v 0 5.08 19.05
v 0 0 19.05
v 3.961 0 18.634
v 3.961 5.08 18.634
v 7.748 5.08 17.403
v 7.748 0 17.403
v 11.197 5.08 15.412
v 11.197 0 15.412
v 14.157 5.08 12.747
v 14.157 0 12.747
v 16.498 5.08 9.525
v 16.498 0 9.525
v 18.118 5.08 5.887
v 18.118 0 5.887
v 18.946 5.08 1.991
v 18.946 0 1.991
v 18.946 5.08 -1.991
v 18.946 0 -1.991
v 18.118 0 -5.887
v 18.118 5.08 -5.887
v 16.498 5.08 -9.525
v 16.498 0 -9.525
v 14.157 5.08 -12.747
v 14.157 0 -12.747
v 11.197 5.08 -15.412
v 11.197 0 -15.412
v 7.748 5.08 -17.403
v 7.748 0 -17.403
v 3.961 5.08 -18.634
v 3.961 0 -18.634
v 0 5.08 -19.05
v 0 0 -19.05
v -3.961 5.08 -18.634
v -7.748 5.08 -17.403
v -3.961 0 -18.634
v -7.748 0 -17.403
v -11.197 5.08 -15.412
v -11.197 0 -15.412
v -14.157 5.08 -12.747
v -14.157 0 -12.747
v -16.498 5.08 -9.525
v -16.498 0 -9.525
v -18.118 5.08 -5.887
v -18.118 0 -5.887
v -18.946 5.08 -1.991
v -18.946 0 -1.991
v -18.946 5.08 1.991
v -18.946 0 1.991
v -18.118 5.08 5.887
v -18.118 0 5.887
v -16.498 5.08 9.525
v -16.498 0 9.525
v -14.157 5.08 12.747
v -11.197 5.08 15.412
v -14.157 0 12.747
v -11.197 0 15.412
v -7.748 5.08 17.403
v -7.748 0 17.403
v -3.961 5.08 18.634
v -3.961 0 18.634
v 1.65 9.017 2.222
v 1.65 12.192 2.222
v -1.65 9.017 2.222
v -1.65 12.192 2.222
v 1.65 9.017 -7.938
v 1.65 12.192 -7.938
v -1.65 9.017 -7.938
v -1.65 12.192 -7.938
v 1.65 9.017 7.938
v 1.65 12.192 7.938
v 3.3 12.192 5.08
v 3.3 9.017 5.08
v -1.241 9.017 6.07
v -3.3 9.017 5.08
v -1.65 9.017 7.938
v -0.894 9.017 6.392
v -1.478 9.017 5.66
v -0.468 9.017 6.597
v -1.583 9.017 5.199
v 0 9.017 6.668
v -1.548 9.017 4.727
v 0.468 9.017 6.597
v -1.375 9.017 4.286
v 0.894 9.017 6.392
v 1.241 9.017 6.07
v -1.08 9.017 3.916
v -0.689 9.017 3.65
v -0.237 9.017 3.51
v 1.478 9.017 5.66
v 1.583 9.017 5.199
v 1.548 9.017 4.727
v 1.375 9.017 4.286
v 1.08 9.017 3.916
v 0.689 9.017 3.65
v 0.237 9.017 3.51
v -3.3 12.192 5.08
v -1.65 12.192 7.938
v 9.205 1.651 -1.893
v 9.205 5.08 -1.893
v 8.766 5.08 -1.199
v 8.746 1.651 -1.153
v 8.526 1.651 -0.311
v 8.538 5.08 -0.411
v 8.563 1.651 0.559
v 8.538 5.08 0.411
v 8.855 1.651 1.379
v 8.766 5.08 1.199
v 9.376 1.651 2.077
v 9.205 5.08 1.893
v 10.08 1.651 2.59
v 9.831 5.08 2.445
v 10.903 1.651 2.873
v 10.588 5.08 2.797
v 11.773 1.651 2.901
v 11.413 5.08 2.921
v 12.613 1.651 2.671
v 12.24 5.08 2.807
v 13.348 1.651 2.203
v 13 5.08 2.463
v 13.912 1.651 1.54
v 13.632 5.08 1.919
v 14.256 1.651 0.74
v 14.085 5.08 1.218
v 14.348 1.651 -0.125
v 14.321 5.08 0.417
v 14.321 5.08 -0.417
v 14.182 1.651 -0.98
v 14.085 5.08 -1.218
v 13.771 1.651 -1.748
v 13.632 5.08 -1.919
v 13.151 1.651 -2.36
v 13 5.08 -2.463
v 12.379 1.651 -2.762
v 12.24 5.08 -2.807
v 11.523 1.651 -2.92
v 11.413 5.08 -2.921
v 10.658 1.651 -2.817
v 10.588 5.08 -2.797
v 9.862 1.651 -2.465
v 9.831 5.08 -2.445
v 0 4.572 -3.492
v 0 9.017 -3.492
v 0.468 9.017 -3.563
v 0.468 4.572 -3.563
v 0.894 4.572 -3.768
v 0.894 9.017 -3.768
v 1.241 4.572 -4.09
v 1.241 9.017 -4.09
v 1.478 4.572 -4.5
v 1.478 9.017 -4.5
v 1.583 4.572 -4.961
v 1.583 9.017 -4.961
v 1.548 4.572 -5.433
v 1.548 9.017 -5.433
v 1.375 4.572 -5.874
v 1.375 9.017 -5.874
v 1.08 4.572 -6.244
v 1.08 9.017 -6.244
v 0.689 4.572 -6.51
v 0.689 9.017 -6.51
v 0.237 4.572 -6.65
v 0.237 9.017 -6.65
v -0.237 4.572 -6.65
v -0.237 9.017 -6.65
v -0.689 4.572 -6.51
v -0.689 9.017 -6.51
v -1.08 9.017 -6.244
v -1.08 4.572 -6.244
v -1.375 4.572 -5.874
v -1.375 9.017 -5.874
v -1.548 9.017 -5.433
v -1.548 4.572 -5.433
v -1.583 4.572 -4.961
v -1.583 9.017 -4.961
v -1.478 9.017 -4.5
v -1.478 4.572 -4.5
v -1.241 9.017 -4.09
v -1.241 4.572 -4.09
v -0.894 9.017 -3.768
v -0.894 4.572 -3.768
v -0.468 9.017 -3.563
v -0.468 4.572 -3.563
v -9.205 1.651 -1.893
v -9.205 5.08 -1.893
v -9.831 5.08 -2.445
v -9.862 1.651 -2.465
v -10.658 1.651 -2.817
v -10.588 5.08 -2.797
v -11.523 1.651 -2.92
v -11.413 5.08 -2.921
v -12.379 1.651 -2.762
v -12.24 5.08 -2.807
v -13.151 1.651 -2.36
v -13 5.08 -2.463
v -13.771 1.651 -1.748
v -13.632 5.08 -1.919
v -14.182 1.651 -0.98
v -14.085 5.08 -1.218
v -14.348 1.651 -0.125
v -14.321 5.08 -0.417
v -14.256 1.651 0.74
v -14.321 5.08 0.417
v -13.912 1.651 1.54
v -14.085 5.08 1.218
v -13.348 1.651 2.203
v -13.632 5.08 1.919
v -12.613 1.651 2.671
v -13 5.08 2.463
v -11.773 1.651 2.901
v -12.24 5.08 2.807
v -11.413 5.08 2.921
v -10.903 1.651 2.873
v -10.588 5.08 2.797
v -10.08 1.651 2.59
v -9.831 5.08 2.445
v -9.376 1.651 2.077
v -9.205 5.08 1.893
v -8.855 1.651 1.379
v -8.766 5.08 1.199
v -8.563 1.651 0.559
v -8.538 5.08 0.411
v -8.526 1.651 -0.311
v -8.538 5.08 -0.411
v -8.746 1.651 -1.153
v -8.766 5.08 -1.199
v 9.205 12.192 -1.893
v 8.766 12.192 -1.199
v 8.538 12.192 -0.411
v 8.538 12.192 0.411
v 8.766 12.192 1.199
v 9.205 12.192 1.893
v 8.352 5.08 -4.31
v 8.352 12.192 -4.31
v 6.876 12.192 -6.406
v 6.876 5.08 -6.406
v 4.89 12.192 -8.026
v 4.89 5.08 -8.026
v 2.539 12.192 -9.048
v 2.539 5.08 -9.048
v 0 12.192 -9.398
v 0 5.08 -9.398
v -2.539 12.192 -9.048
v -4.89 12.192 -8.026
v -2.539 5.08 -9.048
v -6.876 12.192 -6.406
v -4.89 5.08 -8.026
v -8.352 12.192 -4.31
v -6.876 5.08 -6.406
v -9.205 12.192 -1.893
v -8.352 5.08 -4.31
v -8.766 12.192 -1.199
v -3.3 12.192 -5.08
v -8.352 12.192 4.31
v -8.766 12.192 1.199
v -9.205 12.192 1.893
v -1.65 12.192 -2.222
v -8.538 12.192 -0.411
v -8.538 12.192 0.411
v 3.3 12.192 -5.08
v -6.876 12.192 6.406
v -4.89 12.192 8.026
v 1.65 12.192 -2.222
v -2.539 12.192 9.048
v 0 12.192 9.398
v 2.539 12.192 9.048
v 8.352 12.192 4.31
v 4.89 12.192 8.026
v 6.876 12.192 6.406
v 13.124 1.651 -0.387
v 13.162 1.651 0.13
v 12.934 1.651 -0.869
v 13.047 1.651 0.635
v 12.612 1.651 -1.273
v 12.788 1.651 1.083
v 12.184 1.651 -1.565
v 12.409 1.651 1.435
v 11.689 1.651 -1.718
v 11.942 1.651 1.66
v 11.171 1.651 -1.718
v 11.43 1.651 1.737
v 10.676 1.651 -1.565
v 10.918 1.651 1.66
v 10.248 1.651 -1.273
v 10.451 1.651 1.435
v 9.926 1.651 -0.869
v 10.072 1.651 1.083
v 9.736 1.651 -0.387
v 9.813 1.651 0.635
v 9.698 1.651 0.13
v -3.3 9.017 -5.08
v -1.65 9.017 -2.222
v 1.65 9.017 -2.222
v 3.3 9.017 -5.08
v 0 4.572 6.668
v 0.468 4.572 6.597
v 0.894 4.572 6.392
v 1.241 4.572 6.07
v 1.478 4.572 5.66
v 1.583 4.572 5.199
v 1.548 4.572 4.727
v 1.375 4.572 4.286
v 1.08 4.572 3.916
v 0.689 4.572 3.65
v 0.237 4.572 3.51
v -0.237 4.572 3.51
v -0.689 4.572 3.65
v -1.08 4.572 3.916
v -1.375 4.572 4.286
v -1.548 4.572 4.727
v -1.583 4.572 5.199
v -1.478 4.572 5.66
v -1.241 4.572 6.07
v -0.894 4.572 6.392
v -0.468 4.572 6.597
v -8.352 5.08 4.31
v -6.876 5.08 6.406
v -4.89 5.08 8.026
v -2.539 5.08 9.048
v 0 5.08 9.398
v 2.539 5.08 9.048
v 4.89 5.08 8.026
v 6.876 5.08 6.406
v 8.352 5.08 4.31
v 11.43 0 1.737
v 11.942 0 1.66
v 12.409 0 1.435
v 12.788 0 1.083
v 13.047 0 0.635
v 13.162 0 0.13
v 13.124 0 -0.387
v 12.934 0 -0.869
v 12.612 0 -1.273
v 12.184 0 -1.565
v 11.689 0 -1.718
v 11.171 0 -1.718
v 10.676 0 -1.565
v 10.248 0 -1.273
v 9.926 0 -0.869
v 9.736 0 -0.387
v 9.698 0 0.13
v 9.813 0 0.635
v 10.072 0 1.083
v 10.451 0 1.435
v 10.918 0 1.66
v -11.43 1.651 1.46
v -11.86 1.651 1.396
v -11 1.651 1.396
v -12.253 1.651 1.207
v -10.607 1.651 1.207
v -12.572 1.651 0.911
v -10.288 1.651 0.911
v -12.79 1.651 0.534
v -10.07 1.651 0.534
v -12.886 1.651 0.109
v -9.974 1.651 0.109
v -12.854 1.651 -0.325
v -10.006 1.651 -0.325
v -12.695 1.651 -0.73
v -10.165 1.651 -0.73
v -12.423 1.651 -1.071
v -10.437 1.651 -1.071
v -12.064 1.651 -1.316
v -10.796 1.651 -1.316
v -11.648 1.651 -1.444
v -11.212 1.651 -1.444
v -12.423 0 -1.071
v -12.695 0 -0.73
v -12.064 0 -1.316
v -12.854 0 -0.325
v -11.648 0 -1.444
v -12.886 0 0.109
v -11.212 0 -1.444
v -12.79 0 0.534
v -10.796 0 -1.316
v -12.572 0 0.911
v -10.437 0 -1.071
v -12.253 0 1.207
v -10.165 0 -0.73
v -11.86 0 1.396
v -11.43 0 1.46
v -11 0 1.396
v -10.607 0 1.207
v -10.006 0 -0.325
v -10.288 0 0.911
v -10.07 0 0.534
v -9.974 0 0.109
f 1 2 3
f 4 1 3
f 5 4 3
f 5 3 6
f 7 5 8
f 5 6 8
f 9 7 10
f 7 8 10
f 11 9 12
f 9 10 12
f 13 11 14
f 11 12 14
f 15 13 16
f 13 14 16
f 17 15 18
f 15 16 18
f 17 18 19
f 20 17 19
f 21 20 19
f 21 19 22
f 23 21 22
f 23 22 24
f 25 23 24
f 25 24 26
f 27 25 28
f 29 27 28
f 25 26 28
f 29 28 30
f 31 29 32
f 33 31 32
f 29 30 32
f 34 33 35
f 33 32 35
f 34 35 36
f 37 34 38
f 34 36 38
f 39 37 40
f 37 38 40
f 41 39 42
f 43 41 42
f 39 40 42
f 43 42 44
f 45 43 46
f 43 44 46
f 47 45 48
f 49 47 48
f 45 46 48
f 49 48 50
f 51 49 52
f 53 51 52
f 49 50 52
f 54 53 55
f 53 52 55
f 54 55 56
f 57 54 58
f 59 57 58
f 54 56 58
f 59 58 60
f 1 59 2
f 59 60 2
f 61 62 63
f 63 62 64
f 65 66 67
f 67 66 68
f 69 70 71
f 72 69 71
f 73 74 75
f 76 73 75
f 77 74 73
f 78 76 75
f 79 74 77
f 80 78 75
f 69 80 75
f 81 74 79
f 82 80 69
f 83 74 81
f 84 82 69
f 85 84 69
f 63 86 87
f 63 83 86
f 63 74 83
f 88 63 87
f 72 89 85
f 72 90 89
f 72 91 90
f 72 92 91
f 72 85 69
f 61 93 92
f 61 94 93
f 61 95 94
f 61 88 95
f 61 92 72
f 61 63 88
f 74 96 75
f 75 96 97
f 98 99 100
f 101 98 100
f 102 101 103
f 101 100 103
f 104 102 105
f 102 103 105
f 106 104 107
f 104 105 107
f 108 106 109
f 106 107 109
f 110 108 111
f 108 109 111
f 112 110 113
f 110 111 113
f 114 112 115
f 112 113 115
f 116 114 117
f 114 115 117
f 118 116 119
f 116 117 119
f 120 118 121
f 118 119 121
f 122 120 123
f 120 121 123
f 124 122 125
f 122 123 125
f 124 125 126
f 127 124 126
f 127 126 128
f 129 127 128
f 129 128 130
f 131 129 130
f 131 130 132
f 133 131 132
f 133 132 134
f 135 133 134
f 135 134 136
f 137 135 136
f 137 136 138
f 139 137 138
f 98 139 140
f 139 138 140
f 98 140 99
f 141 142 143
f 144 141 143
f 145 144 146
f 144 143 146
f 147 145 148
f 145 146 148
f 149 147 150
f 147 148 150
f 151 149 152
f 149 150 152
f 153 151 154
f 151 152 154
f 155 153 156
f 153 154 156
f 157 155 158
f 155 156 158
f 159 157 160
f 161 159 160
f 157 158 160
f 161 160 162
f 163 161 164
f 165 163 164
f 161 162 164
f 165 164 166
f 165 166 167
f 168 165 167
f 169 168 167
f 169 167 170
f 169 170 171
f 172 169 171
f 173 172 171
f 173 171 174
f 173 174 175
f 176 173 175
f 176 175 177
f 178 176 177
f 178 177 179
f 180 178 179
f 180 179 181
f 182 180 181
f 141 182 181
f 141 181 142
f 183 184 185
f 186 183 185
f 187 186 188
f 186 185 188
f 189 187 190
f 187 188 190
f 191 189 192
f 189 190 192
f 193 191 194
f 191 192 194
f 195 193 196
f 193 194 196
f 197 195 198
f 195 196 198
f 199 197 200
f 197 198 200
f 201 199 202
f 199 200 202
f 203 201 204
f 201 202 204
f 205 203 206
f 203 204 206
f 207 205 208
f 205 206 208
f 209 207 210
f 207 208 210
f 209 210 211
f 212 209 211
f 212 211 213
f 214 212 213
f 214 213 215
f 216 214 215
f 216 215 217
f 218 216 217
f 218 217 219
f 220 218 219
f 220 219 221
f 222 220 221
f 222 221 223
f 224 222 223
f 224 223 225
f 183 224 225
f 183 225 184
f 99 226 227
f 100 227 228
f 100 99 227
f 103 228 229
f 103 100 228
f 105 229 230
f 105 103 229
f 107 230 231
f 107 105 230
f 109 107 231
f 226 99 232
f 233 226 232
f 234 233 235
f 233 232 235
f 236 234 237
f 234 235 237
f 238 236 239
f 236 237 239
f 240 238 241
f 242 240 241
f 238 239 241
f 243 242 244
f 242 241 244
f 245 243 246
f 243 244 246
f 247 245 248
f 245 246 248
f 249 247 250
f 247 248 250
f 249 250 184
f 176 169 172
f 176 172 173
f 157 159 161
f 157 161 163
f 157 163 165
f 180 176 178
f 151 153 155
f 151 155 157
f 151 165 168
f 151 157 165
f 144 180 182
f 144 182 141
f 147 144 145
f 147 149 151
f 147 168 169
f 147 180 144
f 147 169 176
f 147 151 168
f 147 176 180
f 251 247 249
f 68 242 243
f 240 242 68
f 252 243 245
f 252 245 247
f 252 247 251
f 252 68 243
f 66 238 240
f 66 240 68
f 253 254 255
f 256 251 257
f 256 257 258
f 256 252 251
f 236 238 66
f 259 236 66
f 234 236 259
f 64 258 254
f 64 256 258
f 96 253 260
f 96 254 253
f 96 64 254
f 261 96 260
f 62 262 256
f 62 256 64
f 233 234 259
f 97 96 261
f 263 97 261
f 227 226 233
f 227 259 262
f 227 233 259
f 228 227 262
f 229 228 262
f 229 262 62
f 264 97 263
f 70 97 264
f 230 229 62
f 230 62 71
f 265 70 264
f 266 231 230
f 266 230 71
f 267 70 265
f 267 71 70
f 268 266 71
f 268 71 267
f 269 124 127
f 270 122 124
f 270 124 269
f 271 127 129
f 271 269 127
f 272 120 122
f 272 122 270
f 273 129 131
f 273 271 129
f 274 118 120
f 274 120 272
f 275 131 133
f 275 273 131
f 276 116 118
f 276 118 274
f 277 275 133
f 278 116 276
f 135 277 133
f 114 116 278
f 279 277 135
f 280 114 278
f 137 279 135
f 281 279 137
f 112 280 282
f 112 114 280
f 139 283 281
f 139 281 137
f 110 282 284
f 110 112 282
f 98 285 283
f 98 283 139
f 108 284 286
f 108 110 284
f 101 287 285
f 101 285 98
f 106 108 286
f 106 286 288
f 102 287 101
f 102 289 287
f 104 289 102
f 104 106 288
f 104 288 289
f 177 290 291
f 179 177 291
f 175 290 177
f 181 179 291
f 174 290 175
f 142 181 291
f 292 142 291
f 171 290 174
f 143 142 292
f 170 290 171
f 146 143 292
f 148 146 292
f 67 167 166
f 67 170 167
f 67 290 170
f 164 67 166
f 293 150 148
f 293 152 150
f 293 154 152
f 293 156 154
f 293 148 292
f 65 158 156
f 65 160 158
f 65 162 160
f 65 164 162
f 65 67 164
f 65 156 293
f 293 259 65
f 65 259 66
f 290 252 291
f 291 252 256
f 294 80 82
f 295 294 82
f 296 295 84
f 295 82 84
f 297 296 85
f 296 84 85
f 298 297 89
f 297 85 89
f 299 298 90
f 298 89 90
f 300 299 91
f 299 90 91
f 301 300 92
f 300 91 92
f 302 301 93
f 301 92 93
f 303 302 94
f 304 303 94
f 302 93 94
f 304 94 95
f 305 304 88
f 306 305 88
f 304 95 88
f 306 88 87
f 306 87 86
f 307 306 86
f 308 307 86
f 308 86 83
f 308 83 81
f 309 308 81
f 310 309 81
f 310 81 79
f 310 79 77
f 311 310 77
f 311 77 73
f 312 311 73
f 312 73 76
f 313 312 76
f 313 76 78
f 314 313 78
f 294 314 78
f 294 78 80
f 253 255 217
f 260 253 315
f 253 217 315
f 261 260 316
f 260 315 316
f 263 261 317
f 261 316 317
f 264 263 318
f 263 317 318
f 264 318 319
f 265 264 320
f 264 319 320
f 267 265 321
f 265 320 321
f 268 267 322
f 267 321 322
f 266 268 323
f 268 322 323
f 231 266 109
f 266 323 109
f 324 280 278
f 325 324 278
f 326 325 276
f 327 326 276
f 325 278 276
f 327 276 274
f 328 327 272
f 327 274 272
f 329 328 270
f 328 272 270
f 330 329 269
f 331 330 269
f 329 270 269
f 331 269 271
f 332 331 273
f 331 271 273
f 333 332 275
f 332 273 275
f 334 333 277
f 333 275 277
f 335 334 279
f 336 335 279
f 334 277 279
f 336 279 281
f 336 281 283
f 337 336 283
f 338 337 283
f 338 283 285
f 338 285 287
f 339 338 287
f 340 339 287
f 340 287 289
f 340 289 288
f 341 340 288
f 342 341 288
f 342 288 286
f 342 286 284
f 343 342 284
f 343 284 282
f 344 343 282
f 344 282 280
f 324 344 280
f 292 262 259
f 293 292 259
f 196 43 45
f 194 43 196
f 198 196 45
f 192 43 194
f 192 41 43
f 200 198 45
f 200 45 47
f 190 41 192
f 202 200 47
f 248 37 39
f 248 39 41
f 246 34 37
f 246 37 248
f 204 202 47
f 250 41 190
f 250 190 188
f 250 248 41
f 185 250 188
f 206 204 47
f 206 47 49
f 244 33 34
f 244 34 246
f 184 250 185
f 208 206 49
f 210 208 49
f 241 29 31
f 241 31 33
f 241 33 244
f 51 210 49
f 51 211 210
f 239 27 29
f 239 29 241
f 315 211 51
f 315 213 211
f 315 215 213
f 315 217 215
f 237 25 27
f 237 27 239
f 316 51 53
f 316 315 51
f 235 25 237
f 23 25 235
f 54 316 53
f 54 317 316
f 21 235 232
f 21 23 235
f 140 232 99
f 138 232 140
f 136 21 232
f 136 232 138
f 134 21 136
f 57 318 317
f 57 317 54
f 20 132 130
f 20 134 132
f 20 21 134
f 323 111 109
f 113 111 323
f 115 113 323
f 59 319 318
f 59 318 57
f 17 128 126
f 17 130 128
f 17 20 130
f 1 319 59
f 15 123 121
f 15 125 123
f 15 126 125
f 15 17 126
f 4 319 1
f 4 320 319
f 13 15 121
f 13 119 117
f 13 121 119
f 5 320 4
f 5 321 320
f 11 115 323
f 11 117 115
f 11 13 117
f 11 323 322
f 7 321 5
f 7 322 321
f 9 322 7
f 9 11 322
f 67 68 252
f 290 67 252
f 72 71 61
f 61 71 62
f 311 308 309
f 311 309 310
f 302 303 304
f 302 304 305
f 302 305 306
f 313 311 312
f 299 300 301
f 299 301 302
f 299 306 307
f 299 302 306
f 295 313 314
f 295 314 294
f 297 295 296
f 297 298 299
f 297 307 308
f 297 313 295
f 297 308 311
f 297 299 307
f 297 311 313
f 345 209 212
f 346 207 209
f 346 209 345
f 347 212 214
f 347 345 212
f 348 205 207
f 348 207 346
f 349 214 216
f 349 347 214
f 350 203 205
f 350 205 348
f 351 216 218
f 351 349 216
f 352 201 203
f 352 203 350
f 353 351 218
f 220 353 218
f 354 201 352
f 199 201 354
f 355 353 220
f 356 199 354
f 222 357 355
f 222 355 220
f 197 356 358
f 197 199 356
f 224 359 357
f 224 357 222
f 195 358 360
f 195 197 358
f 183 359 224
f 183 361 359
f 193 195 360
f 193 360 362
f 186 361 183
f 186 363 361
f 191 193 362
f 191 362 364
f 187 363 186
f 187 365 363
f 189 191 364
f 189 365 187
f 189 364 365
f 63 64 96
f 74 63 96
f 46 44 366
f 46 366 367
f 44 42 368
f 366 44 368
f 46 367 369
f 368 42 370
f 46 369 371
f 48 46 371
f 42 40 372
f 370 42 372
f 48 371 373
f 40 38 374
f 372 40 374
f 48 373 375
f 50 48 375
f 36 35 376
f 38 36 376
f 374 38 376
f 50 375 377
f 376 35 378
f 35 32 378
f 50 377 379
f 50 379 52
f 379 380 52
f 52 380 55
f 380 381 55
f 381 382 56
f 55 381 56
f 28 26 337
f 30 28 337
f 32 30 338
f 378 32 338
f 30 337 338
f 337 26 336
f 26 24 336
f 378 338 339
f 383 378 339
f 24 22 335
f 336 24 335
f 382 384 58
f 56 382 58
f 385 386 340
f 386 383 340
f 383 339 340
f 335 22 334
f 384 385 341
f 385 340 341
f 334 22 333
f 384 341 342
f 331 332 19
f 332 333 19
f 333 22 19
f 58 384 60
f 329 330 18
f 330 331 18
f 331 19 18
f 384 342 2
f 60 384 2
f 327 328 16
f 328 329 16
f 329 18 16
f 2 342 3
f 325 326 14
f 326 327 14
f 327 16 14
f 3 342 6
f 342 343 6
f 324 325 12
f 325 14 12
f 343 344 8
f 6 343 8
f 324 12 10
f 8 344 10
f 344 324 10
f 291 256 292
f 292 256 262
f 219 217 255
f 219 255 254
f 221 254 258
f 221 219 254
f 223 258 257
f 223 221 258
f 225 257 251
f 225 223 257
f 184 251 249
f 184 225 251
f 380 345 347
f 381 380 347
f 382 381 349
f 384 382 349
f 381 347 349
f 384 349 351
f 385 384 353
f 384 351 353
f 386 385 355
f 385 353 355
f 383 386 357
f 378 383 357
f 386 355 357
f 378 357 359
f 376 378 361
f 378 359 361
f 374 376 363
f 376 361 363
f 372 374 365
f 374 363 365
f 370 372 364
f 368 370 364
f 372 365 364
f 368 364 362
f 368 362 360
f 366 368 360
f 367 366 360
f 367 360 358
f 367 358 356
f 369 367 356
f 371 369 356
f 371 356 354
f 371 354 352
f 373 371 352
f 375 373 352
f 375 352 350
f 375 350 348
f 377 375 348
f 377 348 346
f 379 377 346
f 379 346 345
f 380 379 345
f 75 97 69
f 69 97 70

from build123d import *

# Parameters (mm, degrees)
SKETCH1_R               = 19.05
BOSS_EXTRUDE1_DEPTH     = 5.08
SKETCH4_R               = 9.398
BOSS_EXTRUDE2_DEPTH     = 7.112
SKETCH5_R               = 2.921
CUT_EXTRUDE1_DEPTH      = 28.863695807
CUT_EXTRUDE1_DEPTH_BACK = 3.429
SKETCH6_R               = 1.4605
SKETCH6_R_2             = 1.73706236
CUT_EXTRUDE2_DEPTH      = 28.863695807
CUT_EXTRUDE2_DEPTH_BACK = 28.863695807
CUT_EXTRUDE5_DEPTH      = 3.175
SKETCH10_R              = 1.5875
CUT_EXTRUDE6_DEPTH      = 7.62


with BuildPart() as part:
    # Sketch1 → Boss-Extrude1 (new body)
    with BuildSketch(Plane(origin=(0, 0, 0), x_dir=(1, 0, 0), z_dir=(0, 1, 0))):
        with Locations(Location((0, 0, 0), (0, 0, 270))):
            Circle(SKETCH1_R)
    extrude(amount=BOSS_EXTRUDE1_DEPTH)

    # Sketch4 → Boss-Extrude2 (add)
    with BuildSketch(Plane(origin=(0, 5.08, 0), x_dir=(1, 0, 0), z_dir=(0, 1, 0))):
        with Locations(Location((0, 0, 0), (0, 0, 270))):
            Circle(SKETCH4_R)
    extrude(amount=BOSS_EXTRUDE2_DEPTH)

    # Sketch5 → Cut-Extrude1 (cut, two sides)
    with BuildSketch(Plane(origin=(0, 5.08, 0), x_dir=(1, 0, 0), z_dir=(0, 1, 0))) as cut_extrude1_sk:
        with Locations(Location((-11.43, 0, 0), (0, 0, 40.395058429))):
            Circle(SKETCH5_R)
        with Locations(Location((11.43, 0, 0), (0, 0, 139.604941571))):
            Circle(SKETCH5_R)
    extrude(amount=CUT_EXTRUDE1_DEPTH, mode=Mode.SUBTRACT)
    extrude(cut_extrude1_sk.sketch, amount=-CUT_EXTRUDE1_DEPTH_BACK, mode=Mode.SUBTRACT)

    # Sketch6 → Cut-Extrude2 (cut, two sides)
    with BuildSketch(Plane(origin=(0, 5.08, 0), x_dir=(1, 0, 0), z_dir=(0, 1, 0))) as cut_extrude2_sk:
        with Locations(Location((-11.43, 0, 0), (0, 0, 270))):
            Circle(SKETCH6_R)
        with Locations(Location((11.43, 0, 0), (0, 0, 270))):
            Circle(SKETCH6_R_2)
    extrude(amount=CUT_EXTRUDE2_DEPTH, mode=Mode.SUBTRACT)
    extrude(cut_extrude2_sk.sketch, amount=-CUT_EXTRUDE2_DEPTH_BACK, mode=Mode.SUBTRACT)

    # Sketch9 → Cut-Extrude5 (cut)
    with BuildSketch(Plane(origin=(0, 12.192, 0), x_dir=(1, 0, 0), z_dir=(0, 1, 0))):
        Polygon((3.299556788, 5.08), (1.649778394, 7.9375), (-1.649778394, 7.9375), (-3.299556788, 5.08), (-1.649778394, 2.2225), (1.649778394, 2.2225), align=None)
        Polygon((3.299556788, -5.08), (1.649778394, -2.2225), (-1.649778394, -2.2225), (-3.299556788, -5.08), (-1.649778394, -7.9375), (1.649778394, -7.9375), align=None)
    extrude(amount=-CUT_EXTRUDE5_DEPTH, mode=Mode.SUBTRACT)

    # Sketch10 → Cut-Extrude6 (cut)
    with BuildSketch(Plane(origin=(0, 12.192, 0), x_dir=(1, 0, 0), z_dir=(0, 1, 0))):
        with Locations(Location((0, 5.08, 0), (0, 0, 270))):
            Circle(SKETCH10_R)
        with Locations(Location((0, -5.08, 0), (0, 0, 270))):
            Circle(SKETCH10_R)
    extrude(amount=-CUT_EXTRUDE6_DEPTH, mode=Mode.SUBTRACT)


solid = part.part
